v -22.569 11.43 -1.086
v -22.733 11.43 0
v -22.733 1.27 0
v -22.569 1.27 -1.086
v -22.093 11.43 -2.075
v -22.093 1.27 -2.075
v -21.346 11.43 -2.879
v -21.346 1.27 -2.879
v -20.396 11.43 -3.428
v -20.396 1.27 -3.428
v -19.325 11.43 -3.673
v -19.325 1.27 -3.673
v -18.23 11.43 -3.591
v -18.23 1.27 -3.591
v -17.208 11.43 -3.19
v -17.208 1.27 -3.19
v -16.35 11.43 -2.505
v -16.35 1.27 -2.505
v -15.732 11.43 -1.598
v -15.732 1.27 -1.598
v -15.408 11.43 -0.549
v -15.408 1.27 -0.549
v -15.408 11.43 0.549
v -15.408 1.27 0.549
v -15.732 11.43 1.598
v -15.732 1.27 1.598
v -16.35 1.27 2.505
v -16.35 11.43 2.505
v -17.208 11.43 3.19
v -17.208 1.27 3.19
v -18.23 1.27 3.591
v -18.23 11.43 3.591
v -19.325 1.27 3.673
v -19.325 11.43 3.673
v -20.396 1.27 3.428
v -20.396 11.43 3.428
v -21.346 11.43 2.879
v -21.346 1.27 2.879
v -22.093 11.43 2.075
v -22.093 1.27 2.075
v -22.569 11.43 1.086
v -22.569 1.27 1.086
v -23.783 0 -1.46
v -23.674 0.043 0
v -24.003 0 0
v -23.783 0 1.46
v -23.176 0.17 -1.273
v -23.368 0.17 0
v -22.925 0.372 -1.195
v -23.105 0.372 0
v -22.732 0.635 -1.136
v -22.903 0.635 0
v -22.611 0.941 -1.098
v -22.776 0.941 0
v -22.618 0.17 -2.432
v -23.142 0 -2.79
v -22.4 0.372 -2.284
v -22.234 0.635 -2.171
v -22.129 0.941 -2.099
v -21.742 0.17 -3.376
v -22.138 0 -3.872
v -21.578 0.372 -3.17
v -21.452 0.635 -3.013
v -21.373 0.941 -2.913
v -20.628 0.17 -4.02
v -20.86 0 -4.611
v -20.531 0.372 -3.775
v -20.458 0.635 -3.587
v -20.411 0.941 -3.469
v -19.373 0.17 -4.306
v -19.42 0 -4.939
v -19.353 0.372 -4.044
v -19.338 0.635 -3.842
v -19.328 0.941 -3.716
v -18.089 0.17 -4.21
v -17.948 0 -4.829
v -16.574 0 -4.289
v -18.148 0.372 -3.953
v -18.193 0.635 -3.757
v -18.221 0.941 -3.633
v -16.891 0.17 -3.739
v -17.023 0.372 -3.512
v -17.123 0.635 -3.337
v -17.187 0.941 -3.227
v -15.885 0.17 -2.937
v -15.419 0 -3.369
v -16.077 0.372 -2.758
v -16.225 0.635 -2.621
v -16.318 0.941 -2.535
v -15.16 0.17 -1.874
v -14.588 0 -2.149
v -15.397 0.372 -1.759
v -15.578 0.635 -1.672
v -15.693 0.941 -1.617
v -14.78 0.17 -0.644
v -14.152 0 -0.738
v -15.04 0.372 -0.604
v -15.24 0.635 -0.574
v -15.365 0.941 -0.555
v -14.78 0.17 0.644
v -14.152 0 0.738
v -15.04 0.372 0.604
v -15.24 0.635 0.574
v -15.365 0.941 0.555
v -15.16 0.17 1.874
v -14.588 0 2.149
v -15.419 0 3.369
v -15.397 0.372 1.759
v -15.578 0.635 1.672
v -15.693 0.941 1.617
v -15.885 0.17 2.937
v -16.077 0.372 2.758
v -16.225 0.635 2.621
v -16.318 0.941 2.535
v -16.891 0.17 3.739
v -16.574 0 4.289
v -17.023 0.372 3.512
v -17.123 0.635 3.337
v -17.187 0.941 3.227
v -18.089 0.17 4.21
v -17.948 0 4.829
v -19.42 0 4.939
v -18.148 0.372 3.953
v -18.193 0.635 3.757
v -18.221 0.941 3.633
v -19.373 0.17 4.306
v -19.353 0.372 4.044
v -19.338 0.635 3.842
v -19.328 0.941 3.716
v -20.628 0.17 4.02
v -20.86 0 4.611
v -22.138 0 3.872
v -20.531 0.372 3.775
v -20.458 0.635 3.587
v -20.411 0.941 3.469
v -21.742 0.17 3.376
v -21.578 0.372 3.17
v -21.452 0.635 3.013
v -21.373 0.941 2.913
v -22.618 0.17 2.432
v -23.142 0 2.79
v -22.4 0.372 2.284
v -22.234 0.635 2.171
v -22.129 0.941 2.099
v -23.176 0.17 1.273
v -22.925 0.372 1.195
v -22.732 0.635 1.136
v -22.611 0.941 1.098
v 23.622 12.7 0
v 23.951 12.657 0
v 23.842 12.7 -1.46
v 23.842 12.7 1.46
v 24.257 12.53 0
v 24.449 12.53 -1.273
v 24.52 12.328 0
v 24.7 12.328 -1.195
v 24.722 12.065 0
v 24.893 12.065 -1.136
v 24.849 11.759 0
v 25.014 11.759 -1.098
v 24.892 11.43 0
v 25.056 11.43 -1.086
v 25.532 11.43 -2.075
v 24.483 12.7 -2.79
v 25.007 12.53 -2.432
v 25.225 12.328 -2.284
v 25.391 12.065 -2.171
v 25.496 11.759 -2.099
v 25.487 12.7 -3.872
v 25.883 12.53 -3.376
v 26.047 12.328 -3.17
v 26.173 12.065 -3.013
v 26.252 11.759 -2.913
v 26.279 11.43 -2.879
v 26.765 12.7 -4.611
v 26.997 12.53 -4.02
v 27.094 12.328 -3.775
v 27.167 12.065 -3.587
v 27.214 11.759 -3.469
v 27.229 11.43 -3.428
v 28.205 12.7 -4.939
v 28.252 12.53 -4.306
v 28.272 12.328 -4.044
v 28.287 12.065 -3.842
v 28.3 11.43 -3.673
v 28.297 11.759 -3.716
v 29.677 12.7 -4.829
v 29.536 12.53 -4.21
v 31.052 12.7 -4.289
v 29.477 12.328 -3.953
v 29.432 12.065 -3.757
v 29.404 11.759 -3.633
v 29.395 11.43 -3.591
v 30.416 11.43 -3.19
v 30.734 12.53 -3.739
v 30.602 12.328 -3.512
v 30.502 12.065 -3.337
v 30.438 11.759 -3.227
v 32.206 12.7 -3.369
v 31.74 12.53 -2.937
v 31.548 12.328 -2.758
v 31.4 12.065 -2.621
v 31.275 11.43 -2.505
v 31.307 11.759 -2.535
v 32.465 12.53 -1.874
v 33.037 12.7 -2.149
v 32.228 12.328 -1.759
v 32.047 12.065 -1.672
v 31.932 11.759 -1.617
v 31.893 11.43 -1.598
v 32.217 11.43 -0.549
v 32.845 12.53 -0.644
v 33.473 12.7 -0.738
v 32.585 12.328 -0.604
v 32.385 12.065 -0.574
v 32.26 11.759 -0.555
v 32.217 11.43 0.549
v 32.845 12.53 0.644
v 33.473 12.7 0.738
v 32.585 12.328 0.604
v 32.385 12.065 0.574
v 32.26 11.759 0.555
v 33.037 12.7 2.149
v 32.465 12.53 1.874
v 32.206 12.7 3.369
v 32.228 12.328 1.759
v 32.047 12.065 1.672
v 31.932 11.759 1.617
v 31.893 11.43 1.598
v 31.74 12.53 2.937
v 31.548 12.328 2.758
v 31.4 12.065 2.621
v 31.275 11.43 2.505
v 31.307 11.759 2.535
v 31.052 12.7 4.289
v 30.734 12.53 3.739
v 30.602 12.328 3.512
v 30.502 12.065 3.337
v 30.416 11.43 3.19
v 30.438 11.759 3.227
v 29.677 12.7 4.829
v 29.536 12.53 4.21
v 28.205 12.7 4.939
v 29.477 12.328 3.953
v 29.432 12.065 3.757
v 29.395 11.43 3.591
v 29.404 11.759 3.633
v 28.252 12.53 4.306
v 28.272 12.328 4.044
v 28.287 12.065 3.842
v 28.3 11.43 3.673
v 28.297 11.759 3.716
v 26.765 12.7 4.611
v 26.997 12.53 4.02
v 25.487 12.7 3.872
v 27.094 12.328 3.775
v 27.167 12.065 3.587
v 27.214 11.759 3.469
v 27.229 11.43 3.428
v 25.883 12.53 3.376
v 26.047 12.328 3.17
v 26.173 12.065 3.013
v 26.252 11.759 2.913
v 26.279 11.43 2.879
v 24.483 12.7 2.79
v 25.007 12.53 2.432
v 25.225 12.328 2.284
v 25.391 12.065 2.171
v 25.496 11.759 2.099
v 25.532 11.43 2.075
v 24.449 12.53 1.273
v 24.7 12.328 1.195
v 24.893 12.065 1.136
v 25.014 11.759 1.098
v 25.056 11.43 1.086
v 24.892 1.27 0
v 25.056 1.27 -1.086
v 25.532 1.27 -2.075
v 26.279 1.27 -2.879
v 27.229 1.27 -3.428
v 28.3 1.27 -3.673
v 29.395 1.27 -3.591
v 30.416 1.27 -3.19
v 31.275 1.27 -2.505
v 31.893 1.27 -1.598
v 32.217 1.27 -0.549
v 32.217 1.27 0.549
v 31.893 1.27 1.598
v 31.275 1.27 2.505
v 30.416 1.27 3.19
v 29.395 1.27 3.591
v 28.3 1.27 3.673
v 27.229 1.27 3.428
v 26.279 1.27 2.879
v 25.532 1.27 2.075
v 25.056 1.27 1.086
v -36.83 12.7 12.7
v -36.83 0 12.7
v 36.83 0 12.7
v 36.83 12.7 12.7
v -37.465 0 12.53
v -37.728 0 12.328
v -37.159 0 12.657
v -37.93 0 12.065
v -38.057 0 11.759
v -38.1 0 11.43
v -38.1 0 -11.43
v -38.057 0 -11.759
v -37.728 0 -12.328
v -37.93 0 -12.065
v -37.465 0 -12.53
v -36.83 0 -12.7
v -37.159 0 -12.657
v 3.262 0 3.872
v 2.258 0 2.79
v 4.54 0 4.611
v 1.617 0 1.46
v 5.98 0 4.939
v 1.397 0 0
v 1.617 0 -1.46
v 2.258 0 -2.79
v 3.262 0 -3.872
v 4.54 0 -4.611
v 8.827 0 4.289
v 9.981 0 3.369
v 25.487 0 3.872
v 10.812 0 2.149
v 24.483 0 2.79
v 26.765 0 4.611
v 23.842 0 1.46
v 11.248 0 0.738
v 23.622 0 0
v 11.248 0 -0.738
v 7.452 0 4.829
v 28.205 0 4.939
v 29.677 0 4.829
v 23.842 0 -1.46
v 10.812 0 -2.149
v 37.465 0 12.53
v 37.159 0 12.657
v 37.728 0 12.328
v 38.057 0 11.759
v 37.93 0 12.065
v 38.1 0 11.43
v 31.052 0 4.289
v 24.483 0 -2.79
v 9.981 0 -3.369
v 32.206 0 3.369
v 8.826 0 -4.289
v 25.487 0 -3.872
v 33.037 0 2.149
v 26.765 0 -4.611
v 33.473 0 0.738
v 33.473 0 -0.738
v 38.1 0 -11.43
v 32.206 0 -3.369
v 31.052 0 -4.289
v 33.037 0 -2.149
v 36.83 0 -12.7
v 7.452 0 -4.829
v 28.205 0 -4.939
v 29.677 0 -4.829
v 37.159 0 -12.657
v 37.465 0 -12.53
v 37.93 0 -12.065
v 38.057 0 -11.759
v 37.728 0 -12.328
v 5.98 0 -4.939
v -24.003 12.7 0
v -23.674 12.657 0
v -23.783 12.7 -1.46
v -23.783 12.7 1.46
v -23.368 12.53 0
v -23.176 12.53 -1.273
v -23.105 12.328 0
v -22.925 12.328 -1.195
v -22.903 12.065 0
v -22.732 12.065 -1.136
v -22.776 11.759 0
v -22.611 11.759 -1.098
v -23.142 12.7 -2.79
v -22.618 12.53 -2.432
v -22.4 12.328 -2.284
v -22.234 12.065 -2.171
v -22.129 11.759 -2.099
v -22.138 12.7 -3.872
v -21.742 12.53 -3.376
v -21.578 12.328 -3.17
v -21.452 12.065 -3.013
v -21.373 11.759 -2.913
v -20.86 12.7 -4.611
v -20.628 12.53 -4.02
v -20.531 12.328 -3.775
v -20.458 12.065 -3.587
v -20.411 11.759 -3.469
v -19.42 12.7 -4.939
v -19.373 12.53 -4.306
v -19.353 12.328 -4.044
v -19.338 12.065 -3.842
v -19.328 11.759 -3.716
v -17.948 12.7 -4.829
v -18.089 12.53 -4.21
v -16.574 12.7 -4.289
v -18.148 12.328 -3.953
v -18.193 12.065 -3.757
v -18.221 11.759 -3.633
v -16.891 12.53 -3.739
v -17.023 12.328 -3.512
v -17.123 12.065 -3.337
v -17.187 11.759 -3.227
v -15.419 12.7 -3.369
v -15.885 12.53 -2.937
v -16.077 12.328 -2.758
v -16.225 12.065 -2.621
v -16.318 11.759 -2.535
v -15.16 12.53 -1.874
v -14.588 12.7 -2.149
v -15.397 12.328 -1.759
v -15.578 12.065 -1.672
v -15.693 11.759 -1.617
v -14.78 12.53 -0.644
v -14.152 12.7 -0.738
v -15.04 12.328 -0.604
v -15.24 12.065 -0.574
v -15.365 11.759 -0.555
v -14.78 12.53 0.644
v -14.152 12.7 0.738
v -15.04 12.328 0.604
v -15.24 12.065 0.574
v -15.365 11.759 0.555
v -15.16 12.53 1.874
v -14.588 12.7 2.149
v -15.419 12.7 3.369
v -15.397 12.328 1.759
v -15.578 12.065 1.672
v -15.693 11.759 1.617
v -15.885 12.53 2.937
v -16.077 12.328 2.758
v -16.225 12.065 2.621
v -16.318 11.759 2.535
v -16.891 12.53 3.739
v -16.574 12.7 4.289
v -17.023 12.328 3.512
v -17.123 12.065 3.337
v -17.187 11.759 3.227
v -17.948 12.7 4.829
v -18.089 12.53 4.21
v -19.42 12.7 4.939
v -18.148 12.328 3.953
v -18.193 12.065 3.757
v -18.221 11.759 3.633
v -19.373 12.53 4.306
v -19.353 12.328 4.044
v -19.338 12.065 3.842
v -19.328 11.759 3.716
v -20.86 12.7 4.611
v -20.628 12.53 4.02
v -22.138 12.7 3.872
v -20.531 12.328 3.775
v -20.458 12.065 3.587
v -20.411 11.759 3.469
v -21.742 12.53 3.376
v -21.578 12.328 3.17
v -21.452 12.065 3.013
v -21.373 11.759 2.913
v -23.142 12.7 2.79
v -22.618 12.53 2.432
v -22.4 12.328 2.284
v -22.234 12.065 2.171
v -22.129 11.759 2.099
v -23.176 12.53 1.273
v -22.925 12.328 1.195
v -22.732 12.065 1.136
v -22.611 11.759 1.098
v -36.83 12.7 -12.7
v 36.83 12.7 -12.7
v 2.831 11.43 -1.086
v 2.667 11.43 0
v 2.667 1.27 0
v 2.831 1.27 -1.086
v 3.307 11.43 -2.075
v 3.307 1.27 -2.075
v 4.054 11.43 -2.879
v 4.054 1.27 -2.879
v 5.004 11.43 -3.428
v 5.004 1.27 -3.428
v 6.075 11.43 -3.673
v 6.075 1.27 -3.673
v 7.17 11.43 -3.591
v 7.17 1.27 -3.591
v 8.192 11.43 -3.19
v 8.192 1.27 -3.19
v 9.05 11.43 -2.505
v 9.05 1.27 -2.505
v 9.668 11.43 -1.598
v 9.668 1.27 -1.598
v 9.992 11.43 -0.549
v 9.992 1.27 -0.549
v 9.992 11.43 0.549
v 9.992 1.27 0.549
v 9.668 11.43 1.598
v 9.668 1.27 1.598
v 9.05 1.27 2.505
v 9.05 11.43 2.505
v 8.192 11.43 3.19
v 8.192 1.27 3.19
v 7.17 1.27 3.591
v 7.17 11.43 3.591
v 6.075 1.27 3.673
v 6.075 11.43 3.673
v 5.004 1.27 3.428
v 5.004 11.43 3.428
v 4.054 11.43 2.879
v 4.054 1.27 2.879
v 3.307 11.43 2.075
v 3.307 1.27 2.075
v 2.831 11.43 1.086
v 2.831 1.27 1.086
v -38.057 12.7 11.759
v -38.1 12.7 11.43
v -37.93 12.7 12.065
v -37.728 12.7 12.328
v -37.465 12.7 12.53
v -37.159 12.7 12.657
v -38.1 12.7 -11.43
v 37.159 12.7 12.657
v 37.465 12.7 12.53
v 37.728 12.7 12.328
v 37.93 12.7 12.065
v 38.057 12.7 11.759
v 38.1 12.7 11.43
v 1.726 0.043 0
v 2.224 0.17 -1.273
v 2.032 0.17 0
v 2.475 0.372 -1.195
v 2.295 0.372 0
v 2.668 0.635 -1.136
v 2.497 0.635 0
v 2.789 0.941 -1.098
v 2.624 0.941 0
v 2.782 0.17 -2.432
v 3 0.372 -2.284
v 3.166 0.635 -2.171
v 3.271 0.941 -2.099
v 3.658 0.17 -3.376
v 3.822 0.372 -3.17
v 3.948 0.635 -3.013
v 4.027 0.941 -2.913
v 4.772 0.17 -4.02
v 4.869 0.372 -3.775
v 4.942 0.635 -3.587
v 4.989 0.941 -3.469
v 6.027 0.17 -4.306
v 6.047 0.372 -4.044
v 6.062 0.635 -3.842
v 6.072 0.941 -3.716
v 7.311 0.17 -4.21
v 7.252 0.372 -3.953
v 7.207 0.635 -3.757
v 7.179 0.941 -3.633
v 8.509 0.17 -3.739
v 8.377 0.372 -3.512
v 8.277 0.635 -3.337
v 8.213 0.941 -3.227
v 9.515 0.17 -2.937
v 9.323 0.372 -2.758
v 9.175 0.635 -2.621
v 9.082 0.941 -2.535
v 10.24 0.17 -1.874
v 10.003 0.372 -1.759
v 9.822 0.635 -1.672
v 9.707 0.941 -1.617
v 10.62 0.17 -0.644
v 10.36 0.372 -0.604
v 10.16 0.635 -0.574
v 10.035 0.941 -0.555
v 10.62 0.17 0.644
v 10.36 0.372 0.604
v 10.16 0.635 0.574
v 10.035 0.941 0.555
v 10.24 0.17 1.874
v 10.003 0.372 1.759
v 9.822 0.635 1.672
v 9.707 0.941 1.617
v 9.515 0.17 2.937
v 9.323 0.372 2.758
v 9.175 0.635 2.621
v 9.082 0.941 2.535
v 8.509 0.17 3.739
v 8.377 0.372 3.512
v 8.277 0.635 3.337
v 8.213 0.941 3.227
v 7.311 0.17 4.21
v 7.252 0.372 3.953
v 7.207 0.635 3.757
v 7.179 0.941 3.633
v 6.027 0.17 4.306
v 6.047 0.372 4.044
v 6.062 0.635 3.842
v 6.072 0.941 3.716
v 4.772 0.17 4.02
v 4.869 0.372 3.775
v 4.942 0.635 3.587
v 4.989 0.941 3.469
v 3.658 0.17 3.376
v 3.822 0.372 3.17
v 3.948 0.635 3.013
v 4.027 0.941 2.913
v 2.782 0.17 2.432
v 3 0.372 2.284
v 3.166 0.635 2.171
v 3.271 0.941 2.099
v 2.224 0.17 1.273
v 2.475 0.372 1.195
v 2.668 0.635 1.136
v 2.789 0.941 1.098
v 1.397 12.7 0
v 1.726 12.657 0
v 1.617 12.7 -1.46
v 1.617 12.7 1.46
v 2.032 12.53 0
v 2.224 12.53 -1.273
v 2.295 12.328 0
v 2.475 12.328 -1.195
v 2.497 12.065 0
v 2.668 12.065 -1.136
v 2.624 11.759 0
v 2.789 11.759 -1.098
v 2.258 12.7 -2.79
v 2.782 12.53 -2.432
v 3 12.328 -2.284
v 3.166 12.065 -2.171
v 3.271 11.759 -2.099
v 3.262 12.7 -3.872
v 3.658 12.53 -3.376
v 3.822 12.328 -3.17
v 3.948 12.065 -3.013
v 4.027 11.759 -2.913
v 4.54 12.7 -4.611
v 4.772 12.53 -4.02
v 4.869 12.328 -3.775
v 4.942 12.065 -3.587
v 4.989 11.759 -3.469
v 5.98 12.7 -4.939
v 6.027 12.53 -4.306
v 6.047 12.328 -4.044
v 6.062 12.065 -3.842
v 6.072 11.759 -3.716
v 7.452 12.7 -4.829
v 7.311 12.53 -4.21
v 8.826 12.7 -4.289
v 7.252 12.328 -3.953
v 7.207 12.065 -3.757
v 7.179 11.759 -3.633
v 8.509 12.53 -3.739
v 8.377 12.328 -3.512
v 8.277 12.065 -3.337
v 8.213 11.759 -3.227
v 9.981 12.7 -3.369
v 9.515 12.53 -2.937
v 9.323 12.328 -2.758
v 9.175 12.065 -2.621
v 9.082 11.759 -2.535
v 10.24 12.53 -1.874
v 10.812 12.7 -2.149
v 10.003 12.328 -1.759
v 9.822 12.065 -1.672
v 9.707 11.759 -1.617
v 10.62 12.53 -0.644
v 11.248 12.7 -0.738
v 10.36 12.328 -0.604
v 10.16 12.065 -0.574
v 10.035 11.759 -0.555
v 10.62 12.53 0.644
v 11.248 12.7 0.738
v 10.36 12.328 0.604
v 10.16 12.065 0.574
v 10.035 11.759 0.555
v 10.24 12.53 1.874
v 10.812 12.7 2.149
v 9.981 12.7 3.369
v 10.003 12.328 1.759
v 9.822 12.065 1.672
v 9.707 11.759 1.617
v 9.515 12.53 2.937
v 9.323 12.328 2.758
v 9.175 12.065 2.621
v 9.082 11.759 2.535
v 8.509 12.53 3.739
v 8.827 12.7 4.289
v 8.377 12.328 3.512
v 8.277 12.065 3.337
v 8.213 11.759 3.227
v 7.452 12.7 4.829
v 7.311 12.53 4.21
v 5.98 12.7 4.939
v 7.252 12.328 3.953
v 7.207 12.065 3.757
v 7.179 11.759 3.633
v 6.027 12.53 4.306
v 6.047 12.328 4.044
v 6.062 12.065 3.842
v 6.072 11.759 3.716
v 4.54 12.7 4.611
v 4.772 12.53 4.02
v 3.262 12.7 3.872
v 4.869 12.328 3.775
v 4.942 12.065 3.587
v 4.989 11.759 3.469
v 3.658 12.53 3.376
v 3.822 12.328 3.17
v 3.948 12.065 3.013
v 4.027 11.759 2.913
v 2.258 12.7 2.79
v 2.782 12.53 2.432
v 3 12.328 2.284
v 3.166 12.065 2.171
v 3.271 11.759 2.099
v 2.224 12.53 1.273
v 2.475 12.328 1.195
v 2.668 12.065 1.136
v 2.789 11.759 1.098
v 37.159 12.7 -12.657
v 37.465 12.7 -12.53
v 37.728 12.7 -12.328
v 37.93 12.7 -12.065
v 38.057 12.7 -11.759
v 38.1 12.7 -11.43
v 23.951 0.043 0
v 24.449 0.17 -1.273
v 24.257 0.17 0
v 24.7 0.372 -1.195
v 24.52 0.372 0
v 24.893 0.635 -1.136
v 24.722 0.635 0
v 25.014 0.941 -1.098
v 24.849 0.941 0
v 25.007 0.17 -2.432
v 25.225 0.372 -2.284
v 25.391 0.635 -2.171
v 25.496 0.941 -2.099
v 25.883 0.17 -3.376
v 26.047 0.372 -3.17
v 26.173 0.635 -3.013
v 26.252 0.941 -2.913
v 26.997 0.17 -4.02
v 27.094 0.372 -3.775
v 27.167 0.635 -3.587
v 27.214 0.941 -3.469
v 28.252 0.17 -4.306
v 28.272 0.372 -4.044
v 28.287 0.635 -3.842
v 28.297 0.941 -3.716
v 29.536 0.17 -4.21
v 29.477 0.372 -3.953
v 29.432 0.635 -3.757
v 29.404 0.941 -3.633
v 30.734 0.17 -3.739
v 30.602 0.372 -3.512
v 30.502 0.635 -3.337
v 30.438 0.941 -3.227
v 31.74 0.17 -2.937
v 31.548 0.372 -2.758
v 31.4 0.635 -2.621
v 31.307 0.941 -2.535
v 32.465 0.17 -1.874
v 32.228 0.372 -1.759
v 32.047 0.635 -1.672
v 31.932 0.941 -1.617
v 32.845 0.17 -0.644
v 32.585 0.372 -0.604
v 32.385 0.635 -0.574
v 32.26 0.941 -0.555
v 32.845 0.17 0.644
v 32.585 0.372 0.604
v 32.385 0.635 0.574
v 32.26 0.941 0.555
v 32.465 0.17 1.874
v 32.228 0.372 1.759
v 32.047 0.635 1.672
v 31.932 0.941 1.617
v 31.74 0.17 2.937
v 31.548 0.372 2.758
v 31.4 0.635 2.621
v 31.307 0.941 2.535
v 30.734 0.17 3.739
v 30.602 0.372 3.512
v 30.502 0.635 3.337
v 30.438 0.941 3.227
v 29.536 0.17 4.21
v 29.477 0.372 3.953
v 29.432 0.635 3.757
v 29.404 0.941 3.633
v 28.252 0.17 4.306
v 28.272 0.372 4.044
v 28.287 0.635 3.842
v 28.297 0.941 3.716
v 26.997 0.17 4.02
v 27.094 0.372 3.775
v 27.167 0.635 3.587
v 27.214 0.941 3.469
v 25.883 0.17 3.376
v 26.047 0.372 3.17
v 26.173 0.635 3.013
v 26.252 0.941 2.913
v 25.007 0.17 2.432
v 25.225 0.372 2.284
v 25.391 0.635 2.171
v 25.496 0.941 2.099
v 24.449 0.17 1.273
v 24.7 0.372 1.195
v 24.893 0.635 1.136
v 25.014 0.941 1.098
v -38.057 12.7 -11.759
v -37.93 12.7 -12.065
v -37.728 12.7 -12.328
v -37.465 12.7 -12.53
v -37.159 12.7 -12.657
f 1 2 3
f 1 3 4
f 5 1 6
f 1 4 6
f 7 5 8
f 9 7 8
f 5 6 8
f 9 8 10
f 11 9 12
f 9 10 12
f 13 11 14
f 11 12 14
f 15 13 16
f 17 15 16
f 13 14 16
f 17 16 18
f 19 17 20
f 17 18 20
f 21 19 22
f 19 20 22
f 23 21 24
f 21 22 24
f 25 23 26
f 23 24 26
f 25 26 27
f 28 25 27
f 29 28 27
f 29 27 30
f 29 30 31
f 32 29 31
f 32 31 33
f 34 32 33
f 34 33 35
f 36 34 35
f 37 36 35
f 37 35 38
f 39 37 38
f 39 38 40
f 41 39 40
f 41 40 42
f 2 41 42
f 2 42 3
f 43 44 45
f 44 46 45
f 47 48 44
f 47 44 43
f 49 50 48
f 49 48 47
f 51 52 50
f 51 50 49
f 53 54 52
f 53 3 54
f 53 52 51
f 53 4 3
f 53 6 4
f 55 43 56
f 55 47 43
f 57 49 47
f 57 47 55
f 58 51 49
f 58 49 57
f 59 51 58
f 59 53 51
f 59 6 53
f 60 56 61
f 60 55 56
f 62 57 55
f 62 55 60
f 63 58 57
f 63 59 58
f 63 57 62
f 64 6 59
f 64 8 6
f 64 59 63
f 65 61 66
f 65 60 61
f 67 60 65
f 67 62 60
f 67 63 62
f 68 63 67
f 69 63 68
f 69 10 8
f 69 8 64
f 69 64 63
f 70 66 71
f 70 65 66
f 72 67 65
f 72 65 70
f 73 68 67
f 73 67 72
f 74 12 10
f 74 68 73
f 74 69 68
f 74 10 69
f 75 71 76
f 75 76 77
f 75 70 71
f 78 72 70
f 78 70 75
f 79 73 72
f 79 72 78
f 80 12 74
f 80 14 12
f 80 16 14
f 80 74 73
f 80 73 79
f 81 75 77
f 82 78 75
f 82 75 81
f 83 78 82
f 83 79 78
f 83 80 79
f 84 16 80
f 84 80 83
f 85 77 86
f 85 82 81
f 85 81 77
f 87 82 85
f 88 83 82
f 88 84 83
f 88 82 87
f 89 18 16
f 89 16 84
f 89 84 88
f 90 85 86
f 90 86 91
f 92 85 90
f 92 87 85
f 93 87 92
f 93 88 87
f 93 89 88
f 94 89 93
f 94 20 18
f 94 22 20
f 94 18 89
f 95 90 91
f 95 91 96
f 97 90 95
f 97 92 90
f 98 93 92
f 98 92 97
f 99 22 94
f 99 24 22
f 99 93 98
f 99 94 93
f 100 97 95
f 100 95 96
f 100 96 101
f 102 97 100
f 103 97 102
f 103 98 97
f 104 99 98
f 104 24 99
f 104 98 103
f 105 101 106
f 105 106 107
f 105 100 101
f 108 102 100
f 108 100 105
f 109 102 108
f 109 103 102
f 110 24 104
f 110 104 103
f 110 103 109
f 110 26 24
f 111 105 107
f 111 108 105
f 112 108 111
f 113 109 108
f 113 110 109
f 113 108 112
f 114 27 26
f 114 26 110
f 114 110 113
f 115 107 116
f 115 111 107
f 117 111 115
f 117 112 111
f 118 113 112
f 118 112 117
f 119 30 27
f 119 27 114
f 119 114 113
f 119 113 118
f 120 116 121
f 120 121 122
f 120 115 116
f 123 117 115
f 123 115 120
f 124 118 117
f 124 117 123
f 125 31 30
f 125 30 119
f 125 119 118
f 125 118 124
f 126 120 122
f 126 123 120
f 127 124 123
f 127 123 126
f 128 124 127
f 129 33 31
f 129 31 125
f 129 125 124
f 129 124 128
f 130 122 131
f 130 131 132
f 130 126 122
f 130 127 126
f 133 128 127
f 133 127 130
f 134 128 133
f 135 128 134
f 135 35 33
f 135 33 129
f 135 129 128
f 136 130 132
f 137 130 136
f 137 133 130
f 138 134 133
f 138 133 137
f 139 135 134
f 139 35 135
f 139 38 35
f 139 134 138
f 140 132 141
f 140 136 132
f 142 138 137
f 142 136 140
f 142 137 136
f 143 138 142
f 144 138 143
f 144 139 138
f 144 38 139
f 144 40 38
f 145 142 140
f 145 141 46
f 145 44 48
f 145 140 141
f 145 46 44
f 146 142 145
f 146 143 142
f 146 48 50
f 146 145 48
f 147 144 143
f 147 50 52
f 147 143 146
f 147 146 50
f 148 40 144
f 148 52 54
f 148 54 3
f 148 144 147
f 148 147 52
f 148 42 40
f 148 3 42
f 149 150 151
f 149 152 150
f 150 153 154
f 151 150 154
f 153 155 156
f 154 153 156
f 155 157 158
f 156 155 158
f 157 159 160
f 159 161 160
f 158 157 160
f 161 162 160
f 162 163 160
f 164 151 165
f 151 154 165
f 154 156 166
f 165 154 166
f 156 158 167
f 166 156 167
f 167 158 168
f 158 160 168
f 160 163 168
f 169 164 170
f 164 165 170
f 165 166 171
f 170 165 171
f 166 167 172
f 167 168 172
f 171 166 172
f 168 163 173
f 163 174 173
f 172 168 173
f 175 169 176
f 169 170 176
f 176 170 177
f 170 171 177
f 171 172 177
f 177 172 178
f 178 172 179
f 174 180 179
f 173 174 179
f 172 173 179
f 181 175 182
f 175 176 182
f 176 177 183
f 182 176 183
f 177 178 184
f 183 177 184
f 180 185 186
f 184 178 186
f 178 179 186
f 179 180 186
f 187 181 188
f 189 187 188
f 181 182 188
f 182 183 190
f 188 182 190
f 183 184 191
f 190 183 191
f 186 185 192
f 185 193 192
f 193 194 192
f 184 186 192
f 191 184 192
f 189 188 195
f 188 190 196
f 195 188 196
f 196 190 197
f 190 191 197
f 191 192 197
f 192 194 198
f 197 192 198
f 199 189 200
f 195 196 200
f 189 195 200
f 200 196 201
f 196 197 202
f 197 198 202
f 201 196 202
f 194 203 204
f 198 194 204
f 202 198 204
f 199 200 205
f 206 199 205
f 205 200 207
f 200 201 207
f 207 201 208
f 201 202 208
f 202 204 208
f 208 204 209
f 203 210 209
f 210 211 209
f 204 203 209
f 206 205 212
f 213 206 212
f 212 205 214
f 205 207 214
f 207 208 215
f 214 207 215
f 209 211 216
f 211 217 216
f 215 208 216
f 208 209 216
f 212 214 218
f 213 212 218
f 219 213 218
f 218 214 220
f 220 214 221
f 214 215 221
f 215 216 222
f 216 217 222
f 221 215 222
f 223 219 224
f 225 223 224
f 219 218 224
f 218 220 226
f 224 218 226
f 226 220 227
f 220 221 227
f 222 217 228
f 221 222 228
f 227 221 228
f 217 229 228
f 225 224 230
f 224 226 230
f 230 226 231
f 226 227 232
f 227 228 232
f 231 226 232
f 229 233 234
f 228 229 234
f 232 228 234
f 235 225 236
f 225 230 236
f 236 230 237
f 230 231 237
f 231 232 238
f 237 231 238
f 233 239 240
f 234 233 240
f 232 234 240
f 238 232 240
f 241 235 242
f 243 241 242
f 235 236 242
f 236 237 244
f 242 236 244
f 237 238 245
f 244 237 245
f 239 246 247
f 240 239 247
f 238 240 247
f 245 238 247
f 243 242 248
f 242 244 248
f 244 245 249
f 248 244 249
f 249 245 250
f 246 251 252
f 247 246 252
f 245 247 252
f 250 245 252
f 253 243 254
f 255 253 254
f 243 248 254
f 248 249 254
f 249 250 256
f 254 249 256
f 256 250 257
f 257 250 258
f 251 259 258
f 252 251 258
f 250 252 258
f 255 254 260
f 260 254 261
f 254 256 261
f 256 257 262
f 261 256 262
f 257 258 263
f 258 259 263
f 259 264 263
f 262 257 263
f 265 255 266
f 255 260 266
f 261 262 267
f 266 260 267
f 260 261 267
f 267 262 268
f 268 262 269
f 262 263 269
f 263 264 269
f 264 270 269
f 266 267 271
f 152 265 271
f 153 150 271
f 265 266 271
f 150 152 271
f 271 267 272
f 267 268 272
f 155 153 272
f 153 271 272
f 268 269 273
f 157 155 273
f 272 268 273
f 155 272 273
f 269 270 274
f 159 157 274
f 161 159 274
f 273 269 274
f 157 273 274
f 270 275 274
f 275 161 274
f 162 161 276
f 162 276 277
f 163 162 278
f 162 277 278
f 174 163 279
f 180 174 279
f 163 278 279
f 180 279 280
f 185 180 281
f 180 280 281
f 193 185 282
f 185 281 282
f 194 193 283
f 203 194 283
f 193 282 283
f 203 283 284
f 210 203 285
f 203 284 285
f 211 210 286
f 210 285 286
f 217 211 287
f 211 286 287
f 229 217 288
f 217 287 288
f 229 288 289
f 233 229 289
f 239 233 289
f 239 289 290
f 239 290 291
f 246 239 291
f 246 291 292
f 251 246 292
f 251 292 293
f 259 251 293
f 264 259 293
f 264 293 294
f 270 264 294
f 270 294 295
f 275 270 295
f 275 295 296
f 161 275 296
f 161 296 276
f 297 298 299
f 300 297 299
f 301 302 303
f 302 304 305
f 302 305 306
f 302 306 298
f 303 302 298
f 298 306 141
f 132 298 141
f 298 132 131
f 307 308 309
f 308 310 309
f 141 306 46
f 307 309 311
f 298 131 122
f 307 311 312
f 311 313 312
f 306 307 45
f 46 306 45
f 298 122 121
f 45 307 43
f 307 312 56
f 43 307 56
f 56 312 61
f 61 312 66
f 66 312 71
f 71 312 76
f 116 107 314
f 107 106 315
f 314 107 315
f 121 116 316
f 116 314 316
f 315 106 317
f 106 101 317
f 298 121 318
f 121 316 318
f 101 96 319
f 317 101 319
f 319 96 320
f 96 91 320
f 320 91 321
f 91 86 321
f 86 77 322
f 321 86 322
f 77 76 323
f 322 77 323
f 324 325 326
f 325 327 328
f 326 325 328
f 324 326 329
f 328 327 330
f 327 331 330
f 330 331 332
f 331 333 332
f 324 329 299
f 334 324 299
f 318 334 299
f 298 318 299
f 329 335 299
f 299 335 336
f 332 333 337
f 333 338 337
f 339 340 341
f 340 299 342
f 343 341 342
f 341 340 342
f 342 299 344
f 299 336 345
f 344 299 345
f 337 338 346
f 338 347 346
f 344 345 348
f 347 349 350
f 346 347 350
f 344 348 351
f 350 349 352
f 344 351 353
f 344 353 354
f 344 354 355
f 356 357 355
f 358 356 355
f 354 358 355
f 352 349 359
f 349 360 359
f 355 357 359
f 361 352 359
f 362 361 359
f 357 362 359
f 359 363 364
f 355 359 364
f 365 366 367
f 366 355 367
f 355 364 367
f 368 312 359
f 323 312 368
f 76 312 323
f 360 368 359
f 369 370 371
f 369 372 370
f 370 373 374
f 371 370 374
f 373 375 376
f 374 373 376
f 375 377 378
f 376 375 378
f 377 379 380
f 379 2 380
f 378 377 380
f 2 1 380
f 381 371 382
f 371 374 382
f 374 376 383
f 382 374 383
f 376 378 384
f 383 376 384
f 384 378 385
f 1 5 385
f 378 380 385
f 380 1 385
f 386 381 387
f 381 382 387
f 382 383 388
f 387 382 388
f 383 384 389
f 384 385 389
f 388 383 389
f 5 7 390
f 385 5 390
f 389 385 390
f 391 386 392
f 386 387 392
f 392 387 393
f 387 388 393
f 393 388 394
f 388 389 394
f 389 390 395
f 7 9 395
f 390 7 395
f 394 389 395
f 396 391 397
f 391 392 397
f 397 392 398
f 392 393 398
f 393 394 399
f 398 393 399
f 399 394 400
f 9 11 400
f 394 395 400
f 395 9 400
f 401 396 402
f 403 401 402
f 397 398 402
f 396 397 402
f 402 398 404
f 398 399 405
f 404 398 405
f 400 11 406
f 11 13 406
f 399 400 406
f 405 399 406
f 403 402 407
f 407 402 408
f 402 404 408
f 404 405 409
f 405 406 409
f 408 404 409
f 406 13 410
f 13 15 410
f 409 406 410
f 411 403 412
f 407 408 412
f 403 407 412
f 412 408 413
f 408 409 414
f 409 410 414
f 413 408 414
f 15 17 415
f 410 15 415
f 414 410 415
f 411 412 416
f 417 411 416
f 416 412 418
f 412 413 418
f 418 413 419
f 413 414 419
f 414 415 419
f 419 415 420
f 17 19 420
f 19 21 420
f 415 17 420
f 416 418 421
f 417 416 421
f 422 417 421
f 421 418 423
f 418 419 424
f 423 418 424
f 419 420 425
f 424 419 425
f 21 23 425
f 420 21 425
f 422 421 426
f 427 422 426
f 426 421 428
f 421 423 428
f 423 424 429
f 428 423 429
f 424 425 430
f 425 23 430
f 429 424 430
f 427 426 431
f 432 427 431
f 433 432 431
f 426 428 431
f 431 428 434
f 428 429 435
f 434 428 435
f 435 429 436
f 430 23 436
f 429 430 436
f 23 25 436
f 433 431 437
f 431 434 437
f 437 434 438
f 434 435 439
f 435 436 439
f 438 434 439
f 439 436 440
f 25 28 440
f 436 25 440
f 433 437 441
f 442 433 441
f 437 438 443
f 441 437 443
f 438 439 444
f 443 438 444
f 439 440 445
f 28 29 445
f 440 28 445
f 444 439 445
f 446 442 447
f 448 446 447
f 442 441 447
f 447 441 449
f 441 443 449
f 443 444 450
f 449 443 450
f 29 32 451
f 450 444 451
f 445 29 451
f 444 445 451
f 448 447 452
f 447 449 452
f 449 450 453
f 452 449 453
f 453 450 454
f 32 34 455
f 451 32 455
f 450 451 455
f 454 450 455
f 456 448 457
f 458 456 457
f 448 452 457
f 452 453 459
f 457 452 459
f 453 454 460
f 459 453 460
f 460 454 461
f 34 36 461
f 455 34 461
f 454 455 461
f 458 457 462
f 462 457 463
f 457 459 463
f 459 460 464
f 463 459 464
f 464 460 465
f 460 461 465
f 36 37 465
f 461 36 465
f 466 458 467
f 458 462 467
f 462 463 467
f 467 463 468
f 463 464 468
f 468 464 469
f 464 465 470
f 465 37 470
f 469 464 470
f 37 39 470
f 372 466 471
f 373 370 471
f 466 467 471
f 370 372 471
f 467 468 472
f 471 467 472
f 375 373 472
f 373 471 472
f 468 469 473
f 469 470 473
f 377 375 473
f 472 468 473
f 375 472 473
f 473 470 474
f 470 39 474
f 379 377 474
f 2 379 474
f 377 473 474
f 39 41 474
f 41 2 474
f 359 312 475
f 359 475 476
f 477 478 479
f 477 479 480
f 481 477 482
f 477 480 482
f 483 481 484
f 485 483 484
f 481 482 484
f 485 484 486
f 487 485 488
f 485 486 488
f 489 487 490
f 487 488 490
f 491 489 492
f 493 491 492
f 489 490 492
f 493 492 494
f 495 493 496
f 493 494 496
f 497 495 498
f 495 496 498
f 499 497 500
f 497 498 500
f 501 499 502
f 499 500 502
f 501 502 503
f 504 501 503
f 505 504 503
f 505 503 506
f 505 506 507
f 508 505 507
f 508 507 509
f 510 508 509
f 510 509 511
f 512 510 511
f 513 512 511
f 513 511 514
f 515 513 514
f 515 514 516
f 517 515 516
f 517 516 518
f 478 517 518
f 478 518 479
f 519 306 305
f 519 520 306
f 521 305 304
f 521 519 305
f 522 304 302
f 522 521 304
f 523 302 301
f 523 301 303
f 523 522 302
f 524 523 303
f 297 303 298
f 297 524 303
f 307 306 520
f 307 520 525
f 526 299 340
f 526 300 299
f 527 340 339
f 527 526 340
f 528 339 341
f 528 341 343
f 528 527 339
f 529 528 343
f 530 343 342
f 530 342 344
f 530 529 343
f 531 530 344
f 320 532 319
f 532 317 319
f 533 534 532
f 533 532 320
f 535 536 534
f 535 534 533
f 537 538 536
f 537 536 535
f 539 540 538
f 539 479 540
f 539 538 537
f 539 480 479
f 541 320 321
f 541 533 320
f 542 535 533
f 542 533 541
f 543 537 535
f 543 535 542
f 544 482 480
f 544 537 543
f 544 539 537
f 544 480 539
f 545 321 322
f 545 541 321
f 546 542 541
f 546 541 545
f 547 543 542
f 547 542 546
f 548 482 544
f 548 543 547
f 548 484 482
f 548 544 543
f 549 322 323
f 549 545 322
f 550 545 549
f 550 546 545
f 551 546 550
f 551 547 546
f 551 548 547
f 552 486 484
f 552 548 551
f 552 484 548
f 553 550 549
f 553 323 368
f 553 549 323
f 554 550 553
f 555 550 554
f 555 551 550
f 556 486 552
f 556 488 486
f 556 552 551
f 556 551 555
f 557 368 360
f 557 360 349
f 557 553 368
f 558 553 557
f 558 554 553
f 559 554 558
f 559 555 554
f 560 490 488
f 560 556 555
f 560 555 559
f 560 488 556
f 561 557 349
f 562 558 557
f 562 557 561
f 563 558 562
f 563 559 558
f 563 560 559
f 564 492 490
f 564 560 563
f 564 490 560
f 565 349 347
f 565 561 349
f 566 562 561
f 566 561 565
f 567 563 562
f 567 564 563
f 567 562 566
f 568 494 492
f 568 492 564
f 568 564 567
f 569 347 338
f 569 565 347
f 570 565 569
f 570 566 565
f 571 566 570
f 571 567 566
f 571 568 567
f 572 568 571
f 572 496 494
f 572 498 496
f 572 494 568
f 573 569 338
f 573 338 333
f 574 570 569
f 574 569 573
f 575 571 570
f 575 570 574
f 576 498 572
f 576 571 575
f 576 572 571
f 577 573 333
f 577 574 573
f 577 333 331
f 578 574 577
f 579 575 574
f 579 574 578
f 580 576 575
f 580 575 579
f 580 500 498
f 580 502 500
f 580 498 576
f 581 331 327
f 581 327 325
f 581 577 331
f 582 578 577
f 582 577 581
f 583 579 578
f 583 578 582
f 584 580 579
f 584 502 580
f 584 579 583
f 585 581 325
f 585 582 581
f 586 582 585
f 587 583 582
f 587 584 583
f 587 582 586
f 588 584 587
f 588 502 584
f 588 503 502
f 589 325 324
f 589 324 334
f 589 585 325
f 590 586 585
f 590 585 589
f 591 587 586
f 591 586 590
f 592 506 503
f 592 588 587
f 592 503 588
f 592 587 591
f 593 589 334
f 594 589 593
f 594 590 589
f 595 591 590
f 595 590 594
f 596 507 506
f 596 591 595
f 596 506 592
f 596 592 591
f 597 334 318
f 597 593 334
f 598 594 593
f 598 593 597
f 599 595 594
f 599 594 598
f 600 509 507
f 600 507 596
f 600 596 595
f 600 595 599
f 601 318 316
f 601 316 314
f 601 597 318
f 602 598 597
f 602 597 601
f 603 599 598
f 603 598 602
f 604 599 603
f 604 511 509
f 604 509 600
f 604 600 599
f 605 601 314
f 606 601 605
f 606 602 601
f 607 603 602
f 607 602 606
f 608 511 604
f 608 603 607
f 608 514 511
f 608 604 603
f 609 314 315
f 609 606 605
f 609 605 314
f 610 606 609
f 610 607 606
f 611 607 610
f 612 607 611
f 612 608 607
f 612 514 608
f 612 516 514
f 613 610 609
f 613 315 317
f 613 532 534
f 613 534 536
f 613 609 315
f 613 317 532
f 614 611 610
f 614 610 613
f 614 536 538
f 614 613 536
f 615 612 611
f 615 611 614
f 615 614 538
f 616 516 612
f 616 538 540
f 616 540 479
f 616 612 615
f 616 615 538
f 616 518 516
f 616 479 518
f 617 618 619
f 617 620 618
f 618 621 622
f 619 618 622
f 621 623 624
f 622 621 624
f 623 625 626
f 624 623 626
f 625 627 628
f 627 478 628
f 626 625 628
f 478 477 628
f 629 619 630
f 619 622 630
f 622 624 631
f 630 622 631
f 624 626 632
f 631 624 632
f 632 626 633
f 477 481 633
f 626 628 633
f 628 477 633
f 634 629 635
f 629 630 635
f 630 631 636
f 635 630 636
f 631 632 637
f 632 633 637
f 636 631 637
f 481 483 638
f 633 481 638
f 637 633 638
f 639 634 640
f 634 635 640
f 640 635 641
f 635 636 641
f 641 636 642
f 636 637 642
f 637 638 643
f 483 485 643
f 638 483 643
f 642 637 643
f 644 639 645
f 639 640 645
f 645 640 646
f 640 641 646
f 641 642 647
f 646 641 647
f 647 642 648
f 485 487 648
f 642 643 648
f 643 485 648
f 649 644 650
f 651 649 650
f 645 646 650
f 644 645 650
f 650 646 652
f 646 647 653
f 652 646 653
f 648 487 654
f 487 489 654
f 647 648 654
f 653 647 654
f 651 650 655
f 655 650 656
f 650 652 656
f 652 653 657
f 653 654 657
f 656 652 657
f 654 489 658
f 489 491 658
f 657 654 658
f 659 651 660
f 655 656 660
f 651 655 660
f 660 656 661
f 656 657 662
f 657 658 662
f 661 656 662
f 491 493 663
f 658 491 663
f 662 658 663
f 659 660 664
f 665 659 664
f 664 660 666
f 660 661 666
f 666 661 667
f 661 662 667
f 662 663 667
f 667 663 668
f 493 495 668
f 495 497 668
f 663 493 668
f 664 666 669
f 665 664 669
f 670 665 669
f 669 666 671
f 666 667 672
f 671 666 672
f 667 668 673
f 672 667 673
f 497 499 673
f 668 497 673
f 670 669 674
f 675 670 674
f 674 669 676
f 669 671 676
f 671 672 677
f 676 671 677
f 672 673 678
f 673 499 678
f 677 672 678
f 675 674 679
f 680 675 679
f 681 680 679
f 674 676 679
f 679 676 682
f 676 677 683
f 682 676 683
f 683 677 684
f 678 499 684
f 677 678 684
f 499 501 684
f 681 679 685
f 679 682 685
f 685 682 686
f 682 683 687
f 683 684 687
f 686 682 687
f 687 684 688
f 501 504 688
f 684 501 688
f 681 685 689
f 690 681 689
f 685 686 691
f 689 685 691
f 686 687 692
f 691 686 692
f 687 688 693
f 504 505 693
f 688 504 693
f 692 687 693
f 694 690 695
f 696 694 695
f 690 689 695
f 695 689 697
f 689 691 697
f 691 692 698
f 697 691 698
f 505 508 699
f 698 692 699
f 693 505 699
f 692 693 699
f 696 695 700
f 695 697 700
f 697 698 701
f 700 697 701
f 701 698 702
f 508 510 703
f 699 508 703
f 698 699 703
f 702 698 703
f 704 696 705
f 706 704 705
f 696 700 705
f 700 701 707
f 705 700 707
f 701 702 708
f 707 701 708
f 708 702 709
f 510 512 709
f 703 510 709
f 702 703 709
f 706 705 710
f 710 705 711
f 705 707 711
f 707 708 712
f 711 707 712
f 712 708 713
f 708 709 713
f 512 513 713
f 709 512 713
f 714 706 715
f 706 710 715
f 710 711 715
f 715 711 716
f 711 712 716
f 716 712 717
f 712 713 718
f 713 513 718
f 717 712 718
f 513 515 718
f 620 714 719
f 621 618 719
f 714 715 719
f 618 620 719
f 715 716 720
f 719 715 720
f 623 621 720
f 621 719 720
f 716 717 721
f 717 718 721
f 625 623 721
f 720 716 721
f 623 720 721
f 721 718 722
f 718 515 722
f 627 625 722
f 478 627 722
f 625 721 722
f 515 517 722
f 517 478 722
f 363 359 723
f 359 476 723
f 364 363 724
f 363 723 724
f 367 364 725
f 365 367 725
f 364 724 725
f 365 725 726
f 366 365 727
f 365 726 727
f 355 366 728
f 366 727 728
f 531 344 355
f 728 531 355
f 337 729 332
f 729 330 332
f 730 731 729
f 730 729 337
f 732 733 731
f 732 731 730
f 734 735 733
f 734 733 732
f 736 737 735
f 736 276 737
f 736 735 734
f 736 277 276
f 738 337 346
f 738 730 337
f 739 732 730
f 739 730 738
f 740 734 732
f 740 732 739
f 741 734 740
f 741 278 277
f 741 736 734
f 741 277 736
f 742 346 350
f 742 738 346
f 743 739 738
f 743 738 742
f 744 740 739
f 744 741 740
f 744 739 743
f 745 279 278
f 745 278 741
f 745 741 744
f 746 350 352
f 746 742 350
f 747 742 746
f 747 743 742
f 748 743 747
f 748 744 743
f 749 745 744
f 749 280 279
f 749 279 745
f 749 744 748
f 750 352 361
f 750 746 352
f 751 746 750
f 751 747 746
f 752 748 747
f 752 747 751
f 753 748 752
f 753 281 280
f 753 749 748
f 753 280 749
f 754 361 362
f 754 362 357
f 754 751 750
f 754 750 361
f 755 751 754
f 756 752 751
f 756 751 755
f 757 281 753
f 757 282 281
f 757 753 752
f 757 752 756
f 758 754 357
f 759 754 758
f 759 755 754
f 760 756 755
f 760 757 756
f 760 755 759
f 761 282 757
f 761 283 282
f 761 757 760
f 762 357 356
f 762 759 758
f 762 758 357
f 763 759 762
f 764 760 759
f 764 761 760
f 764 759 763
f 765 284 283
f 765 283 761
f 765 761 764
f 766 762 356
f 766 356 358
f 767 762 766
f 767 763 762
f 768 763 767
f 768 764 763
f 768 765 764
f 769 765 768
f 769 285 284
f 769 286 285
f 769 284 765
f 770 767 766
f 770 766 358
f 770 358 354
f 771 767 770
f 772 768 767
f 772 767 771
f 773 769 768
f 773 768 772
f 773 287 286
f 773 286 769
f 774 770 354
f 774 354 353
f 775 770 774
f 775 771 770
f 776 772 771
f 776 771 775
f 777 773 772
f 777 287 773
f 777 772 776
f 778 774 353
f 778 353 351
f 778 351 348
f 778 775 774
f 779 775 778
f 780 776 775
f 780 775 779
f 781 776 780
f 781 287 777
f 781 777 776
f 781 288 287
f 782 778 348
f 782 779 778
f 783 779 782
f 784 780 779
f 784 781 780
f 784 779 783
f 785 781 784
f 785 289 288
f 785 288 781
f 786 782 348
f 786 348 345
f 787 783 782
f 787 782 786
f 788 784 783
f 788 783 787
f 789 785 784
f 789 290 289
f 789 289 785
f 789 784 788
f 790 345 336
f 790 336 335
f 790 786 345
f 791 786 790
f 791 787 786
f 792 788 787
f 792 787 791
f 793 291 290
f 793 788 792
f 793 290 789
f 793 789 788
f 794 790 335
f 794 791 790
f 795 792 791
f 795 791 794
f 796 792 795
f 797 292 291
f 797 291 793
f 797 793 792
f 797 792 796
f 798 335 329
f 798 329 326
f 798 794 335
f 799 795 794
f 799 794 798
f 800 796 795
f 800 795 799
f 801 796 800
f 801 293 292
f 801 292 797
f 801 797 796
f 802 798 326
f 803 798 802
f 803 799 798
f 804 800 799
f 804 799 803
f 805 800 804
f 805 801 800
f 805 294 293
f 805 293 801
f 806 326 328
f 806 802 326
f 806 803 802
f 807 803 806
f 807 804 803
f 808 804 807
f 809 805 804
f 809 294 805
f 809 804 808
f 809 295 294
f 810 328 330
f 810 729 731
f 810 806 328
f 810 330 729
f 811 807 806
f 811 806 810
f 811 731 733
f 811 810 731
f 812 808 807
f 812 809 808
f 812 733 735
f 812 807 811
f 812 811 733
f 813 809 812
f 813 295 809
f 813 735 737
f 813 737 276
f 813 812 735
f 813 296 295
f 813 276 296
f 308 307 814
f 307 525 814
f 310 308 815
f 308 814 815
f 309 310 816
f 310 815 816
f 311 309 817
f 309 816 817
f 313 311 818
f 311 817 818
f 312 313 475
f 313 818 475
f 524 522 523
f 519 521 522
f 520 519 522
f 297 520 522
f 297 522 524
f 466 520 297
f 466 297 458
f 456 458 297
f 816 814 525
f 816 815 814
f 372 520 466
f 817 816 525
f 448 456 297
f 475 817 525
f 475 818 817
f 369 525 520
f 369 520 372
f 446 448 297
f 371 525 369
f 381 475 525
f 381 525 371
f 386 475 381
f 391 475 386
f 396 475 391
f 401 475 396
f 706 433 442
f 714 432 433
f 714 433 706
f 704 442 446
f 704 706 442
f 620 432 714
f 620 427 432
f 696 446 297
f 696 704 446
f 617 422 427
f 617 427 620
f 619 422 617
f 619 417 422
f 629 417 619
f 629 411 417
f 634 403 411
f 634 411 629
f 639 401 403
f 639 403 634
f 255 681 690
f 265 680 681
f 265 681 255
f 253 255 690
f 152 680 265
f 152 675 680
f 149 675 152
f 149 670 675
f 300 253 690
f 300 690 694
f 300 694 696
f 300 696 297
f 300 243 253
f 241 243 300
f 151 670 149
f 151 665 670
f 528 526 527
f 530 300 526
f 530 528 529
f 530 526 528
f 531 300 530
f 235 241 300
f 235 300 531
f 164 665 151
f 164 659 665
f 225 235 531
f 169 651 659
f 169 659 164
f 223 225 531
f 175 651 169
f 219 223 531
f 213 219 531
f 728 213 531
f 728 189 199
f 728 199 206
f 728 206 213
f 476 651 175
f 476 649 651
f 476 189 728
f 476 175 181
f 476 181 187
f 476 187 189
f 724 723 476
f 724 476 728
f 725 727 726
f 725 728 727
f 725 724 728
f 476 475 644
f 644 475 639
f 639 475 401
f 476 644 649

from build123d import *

# Parameters (mm, degrees)
SKETCH1_W               = 76.2
SKETCH1_H               = 25.4
BOSS_EXTRUDE1_DEPTH     = 12.7
F_1_4_CLEARANCE_HOLE1_D = 7.366
FILLET1_R               = 1.27


with BuildPart() as part:
    # Sketch1 → Boss-Extrude1 (new body)
    with BuildSketch(Plane(origin=(0, 0, 0), x_dir=(1, 0, 0), z_dir=(0, 1, 0))):
        Rectangle(SKETCH1_W, SKETCH1_H)
    extrude(amount=BOSS_EXTRUDE1_DEPTH)

    # 1/4 Clearance Hole1 (through all)
    with Locations(Plane(origin=(0, 12.7, 0), x_dir=(1, 0, 0), z_dir=(0, 1, 0))):
        with Locations((28.575, 0), (-19.05, 0), (6.35, 0)):
            Hole(F_1_4_CLEARANCE_HOLE1_D / 2)

    # Fillet1
    fillet1_edges = [part.edges().sort_by_distance(p)[0] for p in [
        (10.033, 12.7, 0),
        (10.033, 0, 0),
        (-15.367, 12.7, 0),
        (-15.367, 0, 0),
        (32.258, 12.7, 0),
        (32.258, 0, 0),
        (38.1, 6.35, 12.7),
        (-38.1, 6.35, 12.7),
        (-38.1, 6.35, -12.7),
        (38.1, 6.35, -12.7),
    ]]
    fillet(fillet1_edges, radius=FILLET1_R)


solid = part.part
